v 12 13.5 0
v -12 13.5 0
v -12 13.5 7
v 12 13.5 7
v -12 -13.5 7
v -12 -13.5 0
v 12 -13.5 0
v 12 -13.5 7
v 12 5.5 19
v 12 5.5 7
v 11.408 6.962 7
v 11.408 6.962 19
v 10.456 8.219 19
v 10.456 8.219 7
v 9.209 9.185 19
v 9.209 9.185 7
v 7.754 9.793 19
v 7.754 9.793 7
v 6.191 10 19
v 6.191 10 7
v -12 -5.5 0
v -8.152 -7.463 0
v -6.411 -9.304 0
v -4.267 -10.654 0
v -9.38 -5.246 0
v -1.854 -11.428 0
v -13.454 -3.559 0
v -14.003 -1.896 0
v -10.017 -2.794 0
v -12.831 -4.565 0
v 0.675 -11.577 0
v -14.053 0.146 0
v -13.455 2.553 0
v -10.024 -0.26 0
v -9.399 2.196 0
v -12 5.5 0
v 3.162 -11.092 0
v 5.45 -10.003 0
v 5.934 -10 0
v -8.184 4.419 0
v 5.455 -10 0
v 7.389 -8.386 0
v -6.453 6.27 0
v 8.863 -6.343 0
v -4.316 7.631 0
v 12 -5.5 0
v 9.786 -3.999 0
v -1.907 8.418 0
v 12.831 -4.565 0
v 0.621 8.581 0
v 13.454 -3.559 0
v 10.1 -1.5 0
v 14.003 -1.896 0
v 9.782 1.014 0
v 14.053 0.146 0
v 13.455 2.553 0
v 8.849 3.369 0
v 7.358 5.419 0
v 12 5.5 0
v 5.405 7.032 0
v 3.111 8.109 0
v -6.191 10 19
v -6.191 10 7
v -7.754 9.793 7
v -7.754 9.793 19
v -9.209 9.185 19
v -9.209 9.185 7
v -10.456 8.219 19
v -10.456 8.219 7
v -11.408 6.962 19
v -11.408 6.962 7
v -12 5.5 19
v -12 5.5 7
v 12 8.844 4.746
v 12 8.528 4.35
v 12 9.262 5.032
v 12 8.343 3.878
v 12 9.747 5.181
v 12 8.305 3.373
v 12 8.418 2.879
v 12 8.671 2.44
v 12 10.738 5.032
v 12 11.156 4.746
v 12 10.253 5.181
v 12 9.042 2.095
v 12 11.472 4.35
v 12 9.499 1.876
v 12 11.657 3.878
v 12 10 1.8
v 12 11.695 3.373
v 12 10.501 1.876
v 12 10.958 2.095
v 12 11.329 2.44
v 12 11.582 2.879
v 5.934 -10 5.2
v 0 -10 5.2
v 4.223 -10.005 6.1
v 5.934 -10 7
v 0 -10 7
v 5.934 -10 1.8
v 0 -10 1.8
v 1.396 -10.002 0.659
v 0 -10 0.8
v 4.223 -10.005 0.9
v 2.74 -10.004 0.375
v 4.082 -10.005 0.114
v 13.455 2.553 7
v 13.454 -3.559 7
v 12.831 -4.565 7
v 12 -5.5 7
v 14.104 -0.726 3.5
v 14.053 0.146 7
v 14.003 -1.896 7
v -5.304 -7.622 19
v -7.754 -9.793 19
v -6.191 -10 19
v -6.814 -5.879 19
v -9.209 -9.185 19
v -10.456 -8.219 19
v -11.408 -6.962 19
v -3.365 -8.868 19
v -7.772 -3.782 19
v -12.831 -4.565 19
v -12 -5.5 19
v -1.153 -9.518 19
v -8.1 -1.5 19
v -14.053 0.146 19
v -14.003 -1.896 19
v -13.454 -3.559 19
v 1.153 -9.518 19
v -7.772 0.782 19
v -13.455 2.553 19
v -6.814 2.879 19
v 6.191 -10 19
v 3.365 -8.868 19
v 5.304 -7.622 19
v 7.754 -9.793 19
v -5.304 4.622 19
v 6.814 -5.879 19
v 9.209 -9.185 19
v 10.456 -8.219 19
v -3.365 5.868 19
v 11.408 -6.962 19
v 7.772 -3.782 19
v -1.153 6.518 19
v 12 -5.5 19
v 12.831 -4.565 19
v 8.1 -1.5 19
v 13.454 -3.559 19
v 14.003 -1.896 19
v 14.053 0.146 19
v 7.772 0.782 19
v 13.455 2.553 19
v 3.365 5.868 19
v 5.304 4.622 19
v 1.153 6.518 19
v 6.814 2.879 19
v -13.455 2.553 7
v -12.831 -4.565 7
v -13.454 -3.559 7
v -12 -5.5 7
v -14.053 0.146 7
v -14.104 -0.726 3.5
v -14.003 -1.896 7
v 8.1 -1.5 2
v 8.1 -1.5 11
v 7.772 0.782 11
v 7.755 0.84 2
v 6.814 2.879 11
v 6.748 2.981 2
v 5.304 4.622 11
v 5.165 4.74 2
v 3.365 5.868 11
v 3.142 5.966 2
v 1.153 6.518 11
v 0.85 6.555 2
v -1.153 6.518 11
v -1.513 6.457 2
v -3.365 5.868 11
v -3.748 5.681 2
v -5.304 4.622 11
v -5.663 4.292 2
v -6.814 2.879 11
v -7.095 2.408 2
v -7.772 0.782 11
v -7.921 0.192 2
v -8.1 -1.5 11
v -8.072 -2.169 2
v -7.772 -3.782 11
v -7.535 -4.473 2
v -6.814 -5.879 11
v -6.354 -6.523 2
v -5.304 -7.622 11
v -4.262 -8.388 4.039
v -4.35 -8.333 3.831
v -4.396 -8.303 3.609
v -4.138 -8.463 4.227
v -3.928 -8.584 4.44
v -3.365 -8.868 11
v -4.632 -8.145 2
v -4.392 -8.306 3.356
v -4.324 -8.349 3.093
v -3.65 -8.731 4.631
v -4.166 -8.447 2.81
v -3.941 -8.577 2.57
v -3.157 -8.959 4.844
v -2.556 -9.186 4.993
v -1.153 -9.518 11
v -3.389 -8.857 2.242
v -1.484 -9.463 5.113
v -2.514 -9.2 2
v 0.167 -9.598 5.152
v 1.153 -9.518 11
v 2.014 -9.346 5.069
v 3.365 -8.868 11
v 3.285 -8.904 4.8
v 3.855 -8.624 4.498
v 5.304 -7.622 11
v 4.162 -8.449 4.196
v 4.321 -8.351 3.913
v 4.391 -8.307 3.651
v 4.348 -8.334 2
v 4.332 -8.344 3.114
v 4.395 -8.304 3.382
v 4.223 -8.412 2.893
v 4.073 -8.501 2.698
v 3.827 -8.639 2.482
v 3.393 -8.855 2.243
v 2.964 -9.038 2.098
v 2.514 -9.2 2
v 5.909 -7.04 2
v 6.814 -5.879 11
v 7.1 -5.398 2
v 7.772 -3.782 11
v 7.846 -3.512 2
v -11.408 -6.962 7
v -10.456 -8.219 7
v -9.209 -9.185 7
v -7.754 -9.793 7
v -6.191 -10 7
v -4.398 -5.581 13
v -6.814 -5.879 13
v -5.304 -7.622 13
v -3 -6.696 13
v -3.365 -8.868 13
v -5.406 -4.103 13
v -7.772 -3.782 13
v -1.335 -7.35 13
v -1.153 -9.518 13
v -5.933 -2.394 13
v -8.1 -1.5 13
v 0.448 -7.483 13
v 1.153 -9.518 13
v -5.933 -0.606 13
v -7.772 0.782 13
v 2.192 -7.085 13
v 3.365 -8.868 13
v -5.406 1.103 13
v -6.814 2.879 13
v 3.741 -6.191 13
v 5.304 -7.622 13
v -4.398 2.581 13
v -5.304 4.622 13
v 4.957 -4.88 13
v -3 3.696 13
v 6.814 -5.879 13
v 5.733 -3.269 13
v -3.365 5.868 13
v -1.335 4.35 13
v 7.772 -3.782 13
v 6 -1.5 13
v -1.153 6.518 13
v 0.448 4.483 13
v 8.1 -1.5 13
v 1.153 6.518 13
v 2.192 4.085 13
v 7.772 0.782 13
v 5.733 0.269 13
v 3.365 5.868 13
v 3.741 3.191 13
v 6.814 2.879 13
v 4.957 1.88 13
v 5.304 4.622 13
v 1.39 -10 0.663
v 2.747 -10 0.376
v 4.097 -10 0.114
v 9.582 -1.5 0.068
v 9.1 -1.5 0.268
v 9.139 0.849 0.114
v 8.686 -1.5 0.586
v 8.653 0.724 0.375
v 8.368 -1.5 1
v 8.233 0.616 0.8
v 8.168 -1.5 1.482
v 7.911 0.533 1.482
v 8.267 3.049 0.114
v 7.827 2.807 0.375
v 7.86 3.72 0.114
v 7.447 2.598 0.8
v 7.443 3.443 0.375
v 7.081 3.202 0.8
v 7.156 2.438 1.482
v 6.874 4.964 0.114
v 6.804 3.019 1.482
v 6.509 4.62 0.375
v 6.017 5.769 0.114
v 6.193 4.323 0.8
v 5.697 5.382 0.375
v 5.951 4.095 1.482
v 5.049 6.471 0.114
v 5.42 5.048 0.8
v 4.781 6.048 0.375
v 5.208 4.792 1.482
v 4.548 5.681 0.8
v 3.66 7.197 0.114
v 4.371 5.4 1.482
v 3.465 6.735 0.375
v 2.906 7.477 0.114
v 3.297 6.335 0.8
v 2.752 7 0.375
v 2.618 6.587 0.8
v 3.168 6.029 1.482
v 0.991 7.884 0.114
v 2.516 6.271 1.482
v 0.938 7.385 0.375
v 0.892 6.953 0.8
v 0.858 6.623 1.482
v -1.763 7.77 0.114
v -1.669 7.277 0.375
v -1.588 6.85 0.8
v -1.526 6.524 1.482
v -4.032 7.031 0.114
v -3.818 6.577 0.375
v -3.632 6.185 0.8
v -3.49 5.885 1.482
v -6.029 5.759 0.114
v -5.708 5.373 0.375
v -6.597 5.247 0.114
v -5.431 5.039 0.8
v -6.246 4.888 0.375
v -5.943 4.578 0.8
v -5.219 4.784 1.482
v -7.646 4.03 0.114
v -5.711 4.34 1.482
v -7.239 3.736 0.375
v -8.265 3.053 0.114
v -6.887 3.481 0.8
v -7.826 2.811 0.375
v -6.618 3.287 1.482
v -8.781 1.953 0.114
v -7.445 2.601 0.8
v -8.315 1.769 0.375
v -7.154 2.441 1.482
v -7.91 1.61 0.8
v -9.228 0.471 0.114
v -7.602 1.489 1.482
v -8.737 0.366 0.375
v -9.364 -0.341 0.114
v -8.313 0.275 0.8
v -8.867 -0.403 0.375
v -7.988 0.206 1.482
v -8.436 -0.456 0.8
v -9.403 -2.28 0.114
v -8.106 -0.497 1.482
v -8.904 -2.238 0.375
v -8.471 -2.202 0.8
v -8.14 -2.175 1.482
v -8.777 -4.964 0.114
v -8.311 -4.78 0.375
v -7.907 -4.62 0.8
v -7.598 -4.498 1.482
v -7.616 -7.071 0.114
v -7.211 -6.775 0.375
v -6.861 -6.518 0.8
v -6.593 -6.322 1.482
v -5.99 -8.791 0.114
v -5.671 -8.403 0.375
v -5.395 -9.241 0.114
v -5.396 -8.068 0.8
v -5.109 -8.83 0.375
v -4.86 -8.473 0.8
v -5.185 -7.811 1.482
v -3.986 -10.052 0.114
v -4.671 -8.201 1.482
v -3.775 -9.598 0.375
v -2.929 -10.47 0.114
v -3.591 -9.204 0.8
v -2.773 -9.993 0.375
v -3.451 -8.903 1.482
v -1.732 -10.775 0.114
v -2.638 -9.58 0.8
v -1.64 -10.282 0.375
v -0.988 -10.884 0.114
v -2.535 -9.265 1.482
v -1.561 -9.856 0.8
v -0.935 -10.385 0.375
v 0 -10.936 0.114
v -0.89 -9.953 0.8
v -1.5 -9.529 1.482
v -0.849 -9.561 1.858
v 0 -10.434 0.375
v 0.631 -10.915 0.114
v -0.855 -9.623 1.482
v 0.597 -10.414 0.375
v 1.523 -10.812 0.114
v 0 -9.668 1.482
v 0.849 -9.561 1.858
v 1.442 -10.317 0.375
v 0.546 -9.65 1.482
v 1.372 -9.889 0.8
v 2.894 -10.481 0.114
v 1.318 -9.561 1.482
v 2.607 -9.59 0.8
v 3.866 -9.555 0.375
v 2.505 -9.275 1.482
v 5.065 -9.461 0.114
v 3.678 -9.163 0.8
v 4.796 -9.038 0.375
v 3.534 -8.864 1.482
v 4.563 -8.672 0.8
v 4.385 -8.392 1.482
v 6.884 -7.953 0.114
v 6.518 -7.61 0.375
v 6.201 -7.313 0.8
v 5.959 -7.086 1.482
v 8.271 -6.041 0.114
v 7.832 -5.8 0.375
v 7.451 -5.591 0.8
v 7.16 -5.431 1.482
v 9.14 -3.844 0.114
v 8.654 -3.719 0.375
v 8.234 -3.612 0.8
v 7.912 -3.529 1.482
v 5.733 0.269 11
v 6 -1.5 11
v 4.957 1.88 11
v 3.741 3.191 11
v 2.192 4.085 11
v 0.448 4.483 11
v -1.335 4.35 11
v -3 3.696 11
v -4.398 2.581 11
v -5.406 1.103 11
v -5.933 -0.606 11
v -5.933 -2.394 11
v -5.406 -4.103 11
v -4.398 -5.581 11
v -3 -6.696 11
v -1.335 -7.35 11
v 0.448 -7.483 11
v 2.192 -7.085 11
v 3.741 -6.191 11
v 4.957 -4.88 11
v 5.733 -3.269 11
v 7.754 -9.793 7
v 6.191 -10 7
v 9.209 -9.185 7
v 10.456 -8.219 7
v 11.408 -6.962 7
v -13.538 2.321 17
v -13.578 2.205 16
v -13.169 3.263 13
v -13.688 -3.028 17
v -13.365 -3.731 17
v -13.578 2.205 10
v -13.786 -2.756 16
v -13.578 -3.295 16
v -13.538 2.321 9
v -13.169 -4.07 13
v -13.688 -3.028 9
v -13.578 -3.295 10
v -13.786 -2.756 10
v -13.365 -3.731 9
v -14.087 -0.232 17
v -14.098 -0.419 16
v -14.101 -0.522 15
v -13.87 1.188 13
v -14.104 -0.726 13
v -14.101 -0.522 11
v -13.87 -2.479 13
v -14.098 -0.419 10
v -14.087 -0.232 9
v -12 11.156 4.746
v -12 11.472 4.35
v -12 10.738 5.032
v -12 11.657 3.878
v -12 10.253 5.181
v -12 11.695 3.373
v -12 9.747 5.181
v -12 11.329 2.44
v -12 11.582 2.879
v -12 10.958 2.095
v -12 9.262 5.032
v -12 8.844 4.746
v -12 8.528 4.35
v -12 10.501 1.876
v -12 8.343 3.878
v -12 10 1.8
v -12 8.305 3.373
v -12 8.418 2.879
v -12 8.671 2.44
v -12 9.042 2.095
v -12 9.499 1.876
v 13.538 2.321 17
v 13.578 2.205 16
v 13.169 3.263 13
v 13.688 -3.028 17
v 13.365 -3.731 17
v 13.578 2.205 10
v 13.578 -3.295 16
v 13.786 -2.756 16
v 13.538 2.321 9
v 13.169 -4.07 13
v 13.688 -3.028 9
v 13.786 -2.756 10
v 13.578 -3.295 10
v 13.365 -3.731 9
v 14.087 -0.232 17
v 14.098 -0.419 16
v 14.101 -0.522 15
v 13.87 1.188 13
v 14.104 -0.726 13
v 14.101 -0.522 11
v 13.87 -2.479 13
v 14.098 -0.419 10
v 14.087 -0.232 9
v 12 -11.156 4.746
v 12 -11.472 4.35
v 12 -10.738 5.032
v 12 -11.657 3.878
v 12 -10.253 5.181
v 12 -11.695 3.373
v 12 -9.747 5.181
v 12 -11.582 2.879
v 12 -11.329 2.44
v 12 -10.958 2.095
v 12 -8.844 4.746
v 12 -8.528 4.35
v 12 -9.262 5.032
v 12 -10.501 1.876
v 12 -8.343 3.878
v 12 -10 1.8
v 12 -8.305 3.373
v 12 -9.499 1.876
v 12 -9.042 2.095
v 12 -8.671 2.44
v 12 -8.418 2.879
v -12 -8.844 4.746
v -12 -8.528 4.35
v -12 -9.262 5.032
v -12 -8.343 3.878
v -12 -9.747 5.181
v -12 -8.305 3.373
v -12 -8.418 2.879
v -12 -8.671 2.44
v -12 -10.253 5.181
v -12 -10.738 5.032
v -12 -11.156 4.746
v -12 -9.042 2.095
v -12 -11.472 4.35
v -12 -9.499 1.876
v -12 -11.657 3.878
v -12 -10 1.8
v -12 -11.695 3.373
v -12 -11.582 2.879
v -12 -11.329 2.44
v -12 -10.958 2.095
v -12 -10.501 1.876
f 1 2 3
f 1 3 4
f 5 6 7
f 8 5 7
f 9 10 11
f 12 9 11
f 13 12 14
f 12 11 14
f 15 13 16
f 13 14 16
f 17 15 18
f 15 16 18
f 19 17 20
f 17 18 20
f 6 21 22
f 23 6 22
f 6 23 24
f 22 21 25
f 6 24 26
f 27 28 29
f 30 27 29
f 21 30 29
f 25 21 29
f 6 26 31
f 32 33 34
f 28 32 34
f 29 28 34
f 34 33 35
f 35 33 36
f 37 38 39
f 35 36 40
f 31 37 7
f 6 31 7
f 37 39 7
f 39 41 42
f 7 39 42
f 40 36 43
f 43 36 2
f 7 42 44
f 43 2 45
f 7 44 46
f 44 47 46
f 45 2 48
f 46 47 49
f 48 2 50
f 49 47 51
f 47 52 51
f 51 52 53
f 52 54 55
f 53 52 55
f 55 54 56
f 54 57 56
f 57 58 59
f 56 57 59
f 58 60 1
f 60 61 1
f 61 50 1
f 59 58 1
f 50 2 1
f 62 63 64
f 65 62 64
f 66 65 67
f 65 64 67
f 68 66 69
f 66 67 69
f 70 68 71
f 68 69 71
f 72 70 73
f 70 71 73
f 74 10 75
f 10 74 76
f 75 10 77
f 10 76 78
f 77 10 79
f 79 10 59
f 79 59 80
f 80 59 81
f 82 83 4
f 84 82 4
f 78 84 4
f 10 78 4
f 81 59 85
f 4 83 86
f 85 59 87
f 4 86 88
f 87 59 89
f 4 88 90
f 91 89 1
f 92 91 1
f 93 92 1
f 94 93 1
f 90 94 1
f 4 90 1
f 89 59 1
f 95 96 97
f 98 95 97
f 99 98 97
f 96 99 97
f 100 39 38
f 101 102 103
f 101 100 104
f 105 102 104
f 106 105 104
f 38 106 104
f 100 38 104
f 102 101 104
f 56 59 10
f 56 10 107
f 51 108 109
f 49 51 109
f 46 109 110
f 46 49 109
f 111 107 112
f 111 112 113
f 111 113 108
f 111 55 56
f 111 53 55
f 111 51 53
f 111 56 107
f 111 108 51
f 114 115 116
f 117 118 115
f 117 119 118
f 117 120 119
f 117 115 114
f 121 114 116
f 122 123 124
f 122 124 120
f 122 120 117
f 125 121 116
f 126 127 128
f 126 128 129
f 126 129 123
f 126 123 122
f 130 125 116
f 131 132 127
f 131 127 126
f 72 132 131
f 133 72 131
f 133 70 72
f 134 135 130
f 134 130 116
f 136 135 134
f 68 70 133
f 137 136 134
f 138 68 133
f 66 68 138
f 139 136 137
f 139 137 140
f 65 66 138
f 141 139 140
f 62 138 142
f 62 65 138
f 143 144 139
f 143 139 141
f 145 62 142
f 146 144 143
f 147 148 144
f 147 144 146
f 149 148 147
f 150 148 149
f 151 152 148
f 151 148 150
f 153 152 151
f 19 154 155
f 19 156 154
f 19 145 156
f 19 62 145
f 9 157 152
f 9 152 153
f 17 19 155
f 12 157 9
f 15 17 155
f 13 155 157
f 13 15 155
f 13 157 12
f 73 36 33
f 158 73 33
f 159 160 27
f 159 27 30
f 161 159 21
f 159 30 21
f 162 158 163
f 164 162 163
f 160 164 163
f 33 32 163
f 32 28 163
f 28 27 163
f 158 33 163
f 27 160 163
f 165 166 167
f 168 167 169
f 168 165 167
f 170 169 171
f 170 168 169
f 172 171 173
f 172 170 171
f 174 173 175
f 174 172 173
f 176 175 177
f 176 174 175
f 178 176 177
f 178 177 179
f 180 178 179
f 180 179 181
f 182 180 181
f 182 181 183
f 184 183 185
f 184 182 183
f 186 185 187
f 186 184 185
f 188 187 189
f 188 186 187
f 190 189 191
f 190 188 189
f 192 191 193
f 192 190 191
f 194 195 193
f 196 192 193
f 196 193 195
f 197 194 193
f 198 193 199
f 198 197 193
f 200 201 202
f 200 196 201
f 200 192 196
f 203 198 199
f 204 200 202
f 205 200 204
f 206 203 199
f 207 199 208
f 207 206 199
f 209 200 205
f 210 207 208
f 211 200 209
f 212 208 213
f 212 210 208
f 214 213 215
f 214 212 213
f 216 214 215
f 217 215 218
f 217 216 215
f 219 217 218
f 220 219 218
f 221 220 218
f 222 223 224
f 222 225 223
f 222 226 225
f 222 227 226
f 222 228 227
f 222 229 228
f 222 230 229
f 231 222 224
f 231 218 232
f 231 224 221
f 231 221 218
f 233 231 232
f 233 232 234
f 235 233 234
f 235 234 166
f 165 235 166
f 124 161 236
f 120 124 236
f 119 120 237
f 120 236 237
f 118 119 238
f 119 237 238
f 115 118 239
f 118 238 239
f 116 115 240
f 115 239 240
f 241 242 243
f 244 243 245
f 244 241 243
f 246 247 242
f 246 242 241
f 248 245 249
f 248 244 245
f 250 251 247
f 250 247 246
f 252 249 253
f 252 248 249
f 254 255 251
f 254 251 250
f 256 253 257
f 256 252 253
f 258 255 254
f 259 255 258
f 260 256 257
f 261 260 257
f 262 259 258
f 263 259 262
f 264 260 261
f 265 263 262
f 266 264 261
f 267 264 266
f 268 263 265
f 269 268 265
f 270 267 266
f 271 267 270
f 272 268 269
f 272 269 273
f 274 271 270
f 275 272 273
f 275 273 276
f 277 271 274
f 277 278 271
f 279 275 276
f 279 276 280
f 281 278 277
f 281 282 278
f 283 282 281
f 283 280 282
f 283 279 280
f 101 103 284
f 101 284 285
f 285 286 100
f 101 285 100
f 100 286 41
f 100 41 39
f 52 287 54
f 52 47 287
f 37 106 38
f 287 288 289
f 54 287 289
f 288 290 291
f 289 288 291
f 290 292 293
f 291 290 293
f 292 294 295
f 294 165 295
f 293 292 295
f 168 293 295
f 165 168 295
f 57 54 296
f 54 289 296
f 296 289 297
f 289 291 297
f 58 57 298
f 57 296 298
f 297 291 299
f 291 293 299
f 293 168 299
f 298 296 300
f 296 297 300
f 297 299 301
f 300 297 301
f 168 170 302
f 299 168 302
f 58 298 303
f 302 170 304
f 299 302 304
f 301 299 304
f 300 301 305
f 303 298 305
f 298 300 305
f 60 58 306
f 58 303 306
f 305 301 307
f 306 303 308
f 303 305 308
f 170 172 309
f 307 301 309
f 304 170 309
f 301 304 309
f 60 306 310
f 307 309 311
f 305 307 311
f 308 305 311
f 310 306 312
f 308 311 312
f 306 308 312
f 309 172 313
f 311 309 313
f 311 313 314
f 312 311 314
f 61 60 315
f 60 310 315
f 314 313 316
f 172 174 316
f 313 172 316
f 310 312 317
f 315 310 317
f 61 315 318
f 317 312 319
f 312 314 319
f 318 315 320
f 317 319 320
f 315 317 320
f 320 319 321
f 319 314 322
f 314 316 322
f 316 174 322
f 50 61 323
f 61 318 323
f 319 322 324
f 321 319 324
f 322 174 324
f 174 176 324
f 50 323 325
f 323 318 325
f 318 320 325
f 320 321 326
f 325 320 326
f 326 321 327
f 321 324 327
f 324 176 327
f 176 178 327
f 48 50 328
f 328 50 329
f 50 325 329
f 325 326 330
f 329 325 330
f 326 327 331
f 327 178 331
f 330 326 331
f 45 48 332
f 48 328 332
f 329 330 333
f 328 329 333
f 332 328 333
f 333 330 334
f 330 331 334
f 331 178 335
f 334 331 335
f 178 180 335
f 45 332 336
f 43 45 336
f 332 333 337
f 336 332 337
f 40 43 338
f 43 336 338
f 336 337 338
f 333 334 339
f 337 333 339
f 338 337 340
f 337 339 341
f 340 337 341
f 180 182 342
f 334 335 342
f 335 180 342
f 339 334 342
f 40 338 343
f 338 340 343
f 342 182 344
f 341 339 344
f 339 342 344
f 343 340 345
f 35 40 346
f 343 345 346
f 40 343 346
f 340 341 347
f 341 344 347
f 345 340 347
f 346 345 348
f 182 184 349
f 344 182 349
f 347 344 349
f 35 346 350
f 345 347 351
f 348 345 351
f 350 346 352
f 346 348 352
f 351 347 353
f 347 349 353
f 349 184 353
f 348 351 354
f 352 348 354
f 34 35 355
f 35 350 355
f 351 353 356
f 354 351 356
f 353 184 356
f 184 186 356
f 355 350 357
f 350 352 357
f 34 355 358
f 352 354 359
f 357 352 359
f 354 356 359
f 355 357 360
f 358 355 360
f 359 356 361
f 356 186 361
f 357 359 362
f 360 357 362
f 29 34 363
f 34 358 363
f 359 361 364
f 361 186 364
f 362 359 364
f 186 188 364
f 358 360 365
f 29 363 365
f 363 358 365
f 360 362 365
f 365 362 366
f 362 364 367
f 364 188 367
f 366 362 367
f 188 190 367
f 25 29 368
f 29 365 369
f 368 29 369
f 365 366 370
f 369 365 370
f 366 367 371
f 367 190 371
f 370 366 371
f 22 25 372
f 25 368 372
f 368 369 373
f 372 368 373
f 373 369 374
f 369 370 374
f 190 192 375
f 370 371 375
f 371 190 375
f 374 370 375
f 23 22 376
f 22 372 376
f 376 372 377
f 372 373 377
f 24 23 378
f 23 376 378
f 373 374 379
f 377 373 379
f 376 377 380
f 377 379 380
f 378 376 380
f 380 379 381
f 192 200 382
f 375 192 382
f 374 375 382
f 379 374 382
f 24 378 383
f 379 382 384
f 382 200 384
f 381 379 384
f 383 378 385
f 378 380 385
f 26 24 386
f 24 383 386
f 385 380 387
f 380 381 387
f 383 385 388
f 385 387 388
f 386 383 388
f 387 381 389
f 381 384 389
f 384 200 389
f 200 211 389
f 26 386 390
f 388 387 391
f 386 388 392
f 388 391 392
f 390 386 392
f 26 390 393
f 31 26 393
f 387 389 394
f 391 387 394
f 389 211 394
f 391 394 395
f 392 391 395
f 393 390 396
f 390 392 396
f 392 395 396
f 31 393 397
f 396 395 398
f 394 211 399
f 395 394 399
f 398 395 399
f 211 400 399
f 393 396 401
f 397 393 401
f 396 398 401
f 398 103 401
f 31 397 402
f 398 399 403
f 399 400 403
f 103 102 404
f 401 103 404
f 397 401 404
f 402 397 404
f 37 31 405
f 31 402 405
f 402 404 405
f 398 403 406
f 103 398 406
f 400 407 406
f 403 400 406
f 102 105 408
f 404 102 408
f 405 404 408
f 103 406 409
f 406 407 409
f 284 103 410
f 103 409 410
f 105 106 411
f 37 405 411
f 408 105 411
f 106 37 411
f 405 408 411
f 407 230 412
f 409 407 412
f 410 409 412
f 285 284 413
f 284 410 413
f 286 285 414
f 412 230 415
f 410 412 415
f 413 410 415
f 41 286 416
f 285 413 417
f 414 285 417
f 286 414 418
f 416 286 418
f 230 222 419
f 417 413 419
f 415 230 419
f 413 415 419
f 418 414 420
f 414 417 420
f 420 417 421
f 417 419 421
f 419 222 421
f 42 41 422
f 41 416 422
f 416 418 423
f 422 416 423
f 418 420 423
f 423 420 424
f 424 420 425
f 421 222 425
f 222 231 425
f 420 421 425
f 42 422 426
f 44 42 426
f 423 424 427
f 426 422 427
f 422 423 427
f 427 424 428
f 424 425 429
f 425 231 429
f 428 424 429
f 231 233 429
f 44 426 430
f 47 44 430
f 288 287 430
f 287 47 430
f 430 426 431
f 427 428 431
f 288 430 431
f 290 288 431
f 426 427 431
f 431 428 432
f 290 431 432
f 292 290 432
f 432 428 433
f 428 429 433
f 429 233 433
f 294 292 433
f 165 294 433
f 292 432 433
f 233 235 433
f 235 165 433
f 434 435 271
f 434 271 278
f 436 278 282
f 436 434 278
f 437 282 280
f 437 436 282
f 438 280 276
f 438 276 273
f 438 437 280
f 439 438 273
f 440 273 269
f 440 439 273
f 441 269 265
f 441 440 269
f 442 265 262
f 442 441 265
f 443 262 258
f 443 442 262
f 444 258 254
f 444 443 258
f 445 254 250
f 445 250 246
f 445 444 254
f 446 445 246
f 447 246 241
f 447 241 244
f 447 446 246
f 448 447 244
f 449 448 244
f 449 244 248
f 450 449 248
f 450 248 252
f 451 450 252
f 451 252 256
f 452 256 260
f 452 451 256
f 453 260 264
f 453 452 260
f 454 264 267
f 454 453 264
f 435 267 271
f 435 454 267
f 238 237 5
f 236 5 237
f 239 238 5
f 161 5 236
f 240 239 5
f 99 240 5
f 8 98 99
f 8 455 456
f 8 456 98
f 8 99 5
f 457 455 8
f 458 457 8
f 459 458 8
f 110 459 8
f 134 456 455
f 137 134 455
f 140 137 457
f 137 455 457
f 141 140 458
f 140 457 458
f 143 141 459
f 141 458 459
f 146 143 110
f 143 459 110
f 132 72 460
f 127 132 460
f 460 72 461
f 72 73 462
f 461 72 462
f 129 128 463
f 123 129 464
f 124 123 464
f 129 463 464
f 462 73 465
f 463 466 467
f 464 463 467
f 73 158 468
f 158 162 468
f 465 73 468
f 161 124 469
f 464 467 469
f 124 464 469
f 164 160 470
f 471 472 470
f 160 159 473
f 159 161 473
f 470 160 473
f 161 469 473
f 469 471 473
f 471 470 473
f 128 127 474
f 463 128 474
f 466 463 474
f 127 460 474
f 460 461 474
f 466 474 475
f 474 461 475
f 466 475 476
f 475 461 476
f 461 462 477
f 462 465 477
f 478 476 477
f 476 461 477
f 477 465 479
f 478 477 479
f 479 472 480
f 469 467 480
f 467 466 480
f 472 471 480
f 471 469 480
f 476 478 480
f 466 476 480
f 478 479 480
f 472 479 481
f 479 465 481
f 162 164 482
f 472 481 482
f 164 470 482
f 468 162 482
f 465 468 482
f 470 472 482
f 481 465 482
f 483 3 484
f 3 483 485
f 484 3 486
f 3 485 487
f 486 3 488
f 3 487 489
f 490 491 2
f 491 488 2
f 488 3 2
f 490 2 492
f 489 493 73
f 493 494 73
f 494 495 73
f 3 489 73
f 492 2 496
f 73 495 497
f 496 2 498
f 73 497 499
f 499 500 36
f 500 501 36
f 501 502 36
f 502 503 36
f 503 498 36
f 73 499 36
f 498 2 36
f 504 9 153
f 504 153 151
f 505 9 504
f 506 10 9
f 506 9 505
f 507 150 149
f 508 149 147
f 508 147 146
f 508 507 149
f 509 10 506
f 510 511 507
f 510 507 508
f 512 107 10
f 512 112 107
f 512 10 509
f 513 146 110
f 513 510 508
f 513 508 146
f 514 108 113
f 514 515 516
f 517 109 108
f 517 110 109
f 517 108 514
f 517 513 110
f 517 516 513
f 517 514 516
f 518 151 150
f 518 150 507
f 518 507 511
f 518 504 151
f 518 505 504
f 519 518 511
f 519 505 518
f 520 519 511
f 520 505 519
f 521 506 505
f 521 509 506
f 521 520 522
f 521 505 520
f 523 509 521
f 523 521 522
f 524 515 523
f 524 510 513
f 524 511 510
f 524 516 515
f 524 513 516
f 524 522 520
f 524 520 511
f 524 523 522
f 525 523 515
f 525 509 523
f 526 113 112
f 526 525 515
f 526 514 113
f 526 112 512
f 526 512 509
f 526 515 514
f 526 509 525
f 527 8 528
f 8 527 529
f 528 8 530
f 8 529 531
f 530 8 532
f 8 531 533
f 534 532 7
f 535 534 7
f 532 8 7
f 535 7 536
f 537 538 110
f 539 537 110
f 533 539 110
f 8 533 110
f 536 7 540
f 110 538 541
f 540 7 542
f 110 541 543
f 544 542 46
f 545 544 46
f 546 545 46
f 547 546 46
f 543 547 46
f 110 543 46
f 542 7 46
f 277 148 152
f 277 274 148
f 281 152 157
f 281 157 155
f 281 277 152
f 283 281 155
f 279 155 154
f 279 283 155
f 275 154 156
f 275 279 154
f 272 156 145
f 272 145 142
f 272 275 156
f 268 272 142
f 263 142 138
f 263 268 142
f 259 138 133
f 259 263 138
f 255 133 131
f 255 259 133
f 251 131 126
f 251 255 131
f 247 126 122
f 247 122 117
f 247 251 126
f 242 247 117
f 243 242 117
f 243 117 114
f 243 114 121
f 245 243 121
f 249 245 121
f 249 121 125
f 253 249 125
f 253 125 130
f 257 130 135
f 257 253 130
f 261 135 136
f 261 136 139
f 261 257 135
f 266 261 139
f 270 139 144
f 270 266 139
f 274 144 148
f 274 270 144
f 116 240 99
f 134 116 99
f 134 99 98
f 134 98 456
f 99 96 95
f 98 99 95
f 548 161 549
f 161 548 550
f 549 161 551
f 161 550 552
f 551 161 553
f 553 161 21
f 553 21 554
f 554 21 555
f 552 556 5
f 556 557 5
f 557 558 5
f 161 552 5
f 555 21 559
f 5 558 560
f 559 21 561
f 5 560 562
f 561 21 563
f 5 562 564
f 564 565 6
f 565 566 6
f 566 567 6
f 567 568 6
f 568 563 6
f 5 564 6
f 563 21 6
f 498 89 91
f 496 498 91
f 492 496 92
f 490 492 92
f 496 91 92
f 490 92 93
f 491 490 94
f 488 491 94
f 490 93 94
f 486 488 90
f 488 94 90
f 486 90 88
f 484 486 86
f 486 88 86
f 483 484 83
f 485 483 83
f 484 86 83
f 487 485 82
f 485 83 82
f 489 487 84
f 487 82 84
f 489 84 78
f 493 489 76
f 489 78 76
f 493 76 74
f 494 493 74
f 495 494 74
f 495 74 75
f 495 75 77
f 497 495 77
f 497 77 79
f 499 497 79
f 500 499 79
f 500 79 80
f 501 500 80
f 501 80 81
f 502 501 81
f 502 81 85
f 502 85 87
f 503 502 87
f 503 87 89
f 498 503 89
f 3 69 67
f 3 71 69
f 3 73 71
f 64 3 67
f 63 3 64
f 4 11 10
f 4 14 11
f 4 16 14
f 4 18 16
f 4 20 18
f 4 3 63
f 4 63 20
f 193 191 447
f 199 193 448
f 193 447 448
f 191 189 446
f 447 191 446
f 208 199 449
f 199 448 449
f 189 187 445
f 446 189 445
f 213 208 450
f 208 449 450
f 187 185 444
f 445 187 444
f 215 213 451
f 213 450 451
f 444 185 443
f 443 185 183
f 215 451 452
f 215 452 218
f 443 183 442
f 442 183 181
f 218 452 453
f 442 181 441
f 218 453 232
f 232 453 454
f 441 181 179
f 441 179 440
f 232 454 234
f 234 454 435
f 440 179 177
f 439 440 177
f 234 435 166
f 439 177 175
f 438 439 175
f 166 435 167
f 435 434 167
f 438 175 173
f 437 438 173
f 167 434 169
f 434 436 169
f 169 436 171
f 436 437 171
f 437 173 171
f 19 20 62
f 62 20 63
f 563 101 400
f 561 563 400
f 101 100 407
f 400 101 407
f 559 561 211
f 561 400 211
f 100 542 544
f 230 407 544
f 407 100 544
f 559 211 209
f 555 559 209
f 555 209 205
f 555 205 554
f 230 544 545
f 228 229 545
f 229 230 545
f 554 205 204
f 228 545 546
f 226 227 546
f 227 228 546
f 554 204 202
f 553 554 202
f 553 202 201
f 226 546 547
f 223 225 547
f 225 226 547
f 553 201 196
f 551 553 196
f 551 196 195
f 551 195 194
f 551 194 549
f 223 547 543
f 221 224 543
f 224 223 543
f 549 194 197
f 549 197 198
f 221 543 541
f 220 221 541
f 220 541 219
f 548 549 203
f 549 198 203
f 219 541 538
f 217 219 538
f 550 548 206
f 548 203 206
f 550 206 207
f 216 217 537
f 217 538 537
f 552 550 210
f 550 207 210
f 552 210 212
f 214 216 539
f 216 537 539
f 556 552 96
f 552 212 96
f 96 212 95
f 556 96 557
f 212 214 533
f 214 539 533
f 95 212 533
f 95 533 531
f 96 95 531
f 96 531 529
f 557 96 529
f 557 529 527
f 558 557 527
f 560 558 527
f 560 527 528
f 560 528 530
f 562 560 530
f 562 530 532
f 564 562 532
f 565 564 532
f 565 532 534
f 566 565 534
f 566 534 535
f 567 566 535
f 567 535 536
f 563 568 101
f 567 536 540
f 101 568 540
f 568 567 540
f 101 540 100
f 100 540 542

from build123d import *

# Parameters (mm, degrees)
SKETCH1_W            = 24
SKETCH1_H            = 3.5
SKETCH1_R            = 8.1
BOSS_EXTRUDE1_DEPTH  = 7
BOSS_EXTRUDE2_START  = 7
SKETCH1_3_R          = 8.1
BOSS_EXTRUDE2_DEPTH  = 12
M3_CLEARANCE_HOLE1_D = 3.4
FILLET1_R            = 6
BOSS_EXTRUDE3_START  = 11
SKETCH1_4_R          = 8.1
SKETCH1_4_R_2        = 6
BOSS_EXTRUDE3_DEPTH  = 2


with BuildPart() as part:
    # Sketch1 → Boss-Extrude1 (new body)
    # profile 1 of 5: a face of its own
    with BuildSketch(Plane.XY):
        with Locations((0, 11.75)):
            Rectangle(SKETCH1_W, SKETCH1_H)
    # profile 2 of 5: a face of its own
    with BuildSketch(Plane.XY):
        with BuildLine():
            Line((-10, 10), (-12, 10))
            Line((-12, 10), (-12, 5.5))
            add(Edge.make_bspline(
                [(-12, 5.5), (-16.208168435, -1.452739177), (-12, -5.5)],
                knots=[0, 0, 0, 0.703674115, 0.703674115, 0.703674115], degree=2))
            Line((-12, -5.5), (-12, -10))
            Line((-12, -10), (-10, -10))
            Line((-10, -10), (-10, -5.5))
            add(Edge.make_bspline(
                [(-10, 5.5), (-13.144989471, -1.593519523), (-10, -5.5)],
                knots=[0, 0, 0, 0.703674115, 0.703674115, 0.703674115], degree=2))
            Line((-10, 5.5), (-10, 10))
        make_face()
    # profile 3 of 5: a face of its own
    with BuildSketch(Plane.XY):
        with BuildLine():
            Line((12, 5.5), (12, 10))
            Line((12, 10), (10, 10))
            Line((10, 10), (10, 5.5))
            add(Edge.make_bspline(
                [(10, 5.5), (13.144989471, -1.593519523), (10, -5.5)],
                knots=[0, 0, 0, 0.703674115, 0.703674115, 0.703674115], degree=2))
            Line((10, -5.5), (10, -10))
            Line((10, -10), (12, -10))
            Line((12, -10), (12, -5.5))
            add(Edge.make_bspline(
                [(12, 5.5), (16.208168435, -1.452739177), (12, -5.5)],
                knots=[0, 0, 0, 0.703674115, 0.703674115, 0.703674115], degree=2))
        make_face()
    # profile 4 of 5: a face of its own
    with BuildSketch(Plane.XY):
        with BuildLine():
            Line((-10, -10), (-12, -10))
            Line((-12, -10), (-12, -13.5))
            Line((-12, -13.5), (12, -13.5))
            Line((12, -13.5), (12, -10))
            Line((12, -10), (10, -10))
            Line((10, -10), (5.934098246, -10))
            add(Edge.make_bspline(
                [(5.934098246, -10), (5.478588927, -10.00932896), (0, -10)],
                knots=[0.968742805, 0.968742805, 0.968742805, 1, 1, 1], degree=2))
            Line((0, -10), (-10, -10))
        make_face()
    # profile 5 of 5: a face of its own
    with BuildSketch(Plane.XY):
        with BuildLine():
            Line((10, 10), (-10, 10))
            Line((-10, 10), (-10, 5.5))
            add(Edge.make_bspline(
                [(-10, 5.5), (-13.144989471, -1.593519523), (-10, -5.5)],
                knots=[0, 0, 0, 0.703674115, 0.703674115, 0.703674115], degree=2))
            Line((-10, -5.5), (-10, -10))
            Line((-10, -10), (0, -10))
            Line((0, -10), (5.934098246, -10))
            Line((5.934098246, -10), (10, -10))
            Line((10, -10), (10, -5.5))
            add(Edge.make_bspline(
                [(10, 5.5), (13.144989471, -1.593519523), (10, -5.5)],
                knots=[0, 0, 0, 0.703674115, 0.703674115, 0.703674115], degree=2))
            Line((10, 5.5), (10, 10))
        make_face()
        with Locations((0, -1.5)):
            Circle(SKETCH1_R, mode=Mode.SUBTRACT)
    extrude(amount=BOSS_EXTRUDE1_DEPTH)

    # Sketch1<3> → Boss-Extrude2 (add)
    with BuildSketch(Plane.XY.offset(BOSS_EXTRUDE2_START)):
        with BuildLine():
            Line((-12, 10), (-12, 5.5))
            add(Edge.make_bspline(
                [(-12, 5.5), (-16.208168435, -1.452739177), (-12, -5.5)],
                knots=[0, 0, 0, 0.703674115, 0.703674115, 0.703674115], degree=2))
            Line((-12, -5.5), (-12, -10))
            Line((-12, -10), (12, -10))
            Line((12, -10), (12, -5.5))
            add(Edge.make_bspline(
                [(12, 5.5), (16.208168435, -1.452739177), (12, -5.5)],
                knots=[0, 0, 0, 0.703674115, 0.703674115, 0.703674115], degree=2))
            Line((12, 5.5), (12, 10))
            Line((12, 10), (-12, 10))
        make_face()
        with Locations((0, -1.5)):
            Circle(SKETCH1_3_R, mode=Mode.SUBTRACT)
    extrude(amount=BOSS_EXTRUDE2_DEPTH)

    # M3 Clearance Hole1 (through all)
    with Locations(Plane.ZY.offset(12)):
        with Locations((3.5, 10), (3.5, -10)):
            Hole(M3_CLEARANCE_HOLE1_D / 2)

    # Fillet1
    # the kernel refuses this fillet: 6 mm, written as the material it takes off along each edge
    with BuildSketch(Plane(origin=(-12, 10, 7), x_dir=(1, 0, 0), z_dir=(0, 0, 1))) as fillet1_piece_1:
        with BuildLine():
            CenterArc((5.809475019, -6), FILLET1_R, 90, 75.522487814)
            Line((0, -4.5), (0, 0))
            Line((0, 0), (5.809475019, 0))
        make_face()
    extrude(amount=26.523687548, mode=Mode.SUBTRACT)
    with BuildSketch(Plane(origin=(12, 10, 7), x_dir=(0, -1, 0), z_dir=(0, 0, 1)), Plane(origin=(-12, -10, 7), x_dir=(0, 1, 0), z_dir=(0, 0, 1))) as fillet1_piece_2:
        with BuildLine():
            CenterArc((6, -5.809475019), FILLET1_R, 104.477512186, 75.522487814)
            Line((0, -5.809475019), (0, 0))
            Line((0, 0), (4.5, 0))
        make_face()
    extrude(amount=26.523687548, mode=Mode.SUBTRACT)
    with BuildSketch(Plane(origin=(12, -10, 7), x_dir=(0, 1, 0), z_dir=(0, 0, 1))) as fillet1_piece_3:
        with BuildLine():
            CenterArc((6, 5.809475019), FILLET1_R, 180, 75.522487814)
            Line((0, 5.809475019), (0, 0))
            Line((0, 0), (4.5, 0))
        make_face()
    extrude(amount=26.523687548, mode=Mode.SUBTRACT)

    # Sketch1<4> → Boss-Extrude3 (add)
    with BuildSketch(Plane.XY.offset(BOSS_EXTRUDE3_START)):
        with Locations((0, -1.5)):
            Circle(SKETCH1_4_R)
        with Locations((0, -1.5)):
            Circle(SKETCH1_4_R_2, mode=Mode.SUBTRACT)
    extrude(amount=BOSS_EXTRUDE3_DEPTH)

    # Fillet2: read off the stored shape, not the designer's step
    # Fillet2 outline → Fillet2 (revolve, cut)
    with BuildSketch(Plane.XZ.offset(1.5)):
        with BuildLine():
            ThreePointArc((10.1, 0), (8.685786438, 0.585786438), (8.1, 2))
            Line((8.1, 2), (8.1, 0))
            Line((8.1, 0), (10.1, 0))
        make_face()
    revolve(axis=Axis((0, -1.5, 0), (0, 0, 1)), mode=Mode.SUBTRACT)


solid = part.part
